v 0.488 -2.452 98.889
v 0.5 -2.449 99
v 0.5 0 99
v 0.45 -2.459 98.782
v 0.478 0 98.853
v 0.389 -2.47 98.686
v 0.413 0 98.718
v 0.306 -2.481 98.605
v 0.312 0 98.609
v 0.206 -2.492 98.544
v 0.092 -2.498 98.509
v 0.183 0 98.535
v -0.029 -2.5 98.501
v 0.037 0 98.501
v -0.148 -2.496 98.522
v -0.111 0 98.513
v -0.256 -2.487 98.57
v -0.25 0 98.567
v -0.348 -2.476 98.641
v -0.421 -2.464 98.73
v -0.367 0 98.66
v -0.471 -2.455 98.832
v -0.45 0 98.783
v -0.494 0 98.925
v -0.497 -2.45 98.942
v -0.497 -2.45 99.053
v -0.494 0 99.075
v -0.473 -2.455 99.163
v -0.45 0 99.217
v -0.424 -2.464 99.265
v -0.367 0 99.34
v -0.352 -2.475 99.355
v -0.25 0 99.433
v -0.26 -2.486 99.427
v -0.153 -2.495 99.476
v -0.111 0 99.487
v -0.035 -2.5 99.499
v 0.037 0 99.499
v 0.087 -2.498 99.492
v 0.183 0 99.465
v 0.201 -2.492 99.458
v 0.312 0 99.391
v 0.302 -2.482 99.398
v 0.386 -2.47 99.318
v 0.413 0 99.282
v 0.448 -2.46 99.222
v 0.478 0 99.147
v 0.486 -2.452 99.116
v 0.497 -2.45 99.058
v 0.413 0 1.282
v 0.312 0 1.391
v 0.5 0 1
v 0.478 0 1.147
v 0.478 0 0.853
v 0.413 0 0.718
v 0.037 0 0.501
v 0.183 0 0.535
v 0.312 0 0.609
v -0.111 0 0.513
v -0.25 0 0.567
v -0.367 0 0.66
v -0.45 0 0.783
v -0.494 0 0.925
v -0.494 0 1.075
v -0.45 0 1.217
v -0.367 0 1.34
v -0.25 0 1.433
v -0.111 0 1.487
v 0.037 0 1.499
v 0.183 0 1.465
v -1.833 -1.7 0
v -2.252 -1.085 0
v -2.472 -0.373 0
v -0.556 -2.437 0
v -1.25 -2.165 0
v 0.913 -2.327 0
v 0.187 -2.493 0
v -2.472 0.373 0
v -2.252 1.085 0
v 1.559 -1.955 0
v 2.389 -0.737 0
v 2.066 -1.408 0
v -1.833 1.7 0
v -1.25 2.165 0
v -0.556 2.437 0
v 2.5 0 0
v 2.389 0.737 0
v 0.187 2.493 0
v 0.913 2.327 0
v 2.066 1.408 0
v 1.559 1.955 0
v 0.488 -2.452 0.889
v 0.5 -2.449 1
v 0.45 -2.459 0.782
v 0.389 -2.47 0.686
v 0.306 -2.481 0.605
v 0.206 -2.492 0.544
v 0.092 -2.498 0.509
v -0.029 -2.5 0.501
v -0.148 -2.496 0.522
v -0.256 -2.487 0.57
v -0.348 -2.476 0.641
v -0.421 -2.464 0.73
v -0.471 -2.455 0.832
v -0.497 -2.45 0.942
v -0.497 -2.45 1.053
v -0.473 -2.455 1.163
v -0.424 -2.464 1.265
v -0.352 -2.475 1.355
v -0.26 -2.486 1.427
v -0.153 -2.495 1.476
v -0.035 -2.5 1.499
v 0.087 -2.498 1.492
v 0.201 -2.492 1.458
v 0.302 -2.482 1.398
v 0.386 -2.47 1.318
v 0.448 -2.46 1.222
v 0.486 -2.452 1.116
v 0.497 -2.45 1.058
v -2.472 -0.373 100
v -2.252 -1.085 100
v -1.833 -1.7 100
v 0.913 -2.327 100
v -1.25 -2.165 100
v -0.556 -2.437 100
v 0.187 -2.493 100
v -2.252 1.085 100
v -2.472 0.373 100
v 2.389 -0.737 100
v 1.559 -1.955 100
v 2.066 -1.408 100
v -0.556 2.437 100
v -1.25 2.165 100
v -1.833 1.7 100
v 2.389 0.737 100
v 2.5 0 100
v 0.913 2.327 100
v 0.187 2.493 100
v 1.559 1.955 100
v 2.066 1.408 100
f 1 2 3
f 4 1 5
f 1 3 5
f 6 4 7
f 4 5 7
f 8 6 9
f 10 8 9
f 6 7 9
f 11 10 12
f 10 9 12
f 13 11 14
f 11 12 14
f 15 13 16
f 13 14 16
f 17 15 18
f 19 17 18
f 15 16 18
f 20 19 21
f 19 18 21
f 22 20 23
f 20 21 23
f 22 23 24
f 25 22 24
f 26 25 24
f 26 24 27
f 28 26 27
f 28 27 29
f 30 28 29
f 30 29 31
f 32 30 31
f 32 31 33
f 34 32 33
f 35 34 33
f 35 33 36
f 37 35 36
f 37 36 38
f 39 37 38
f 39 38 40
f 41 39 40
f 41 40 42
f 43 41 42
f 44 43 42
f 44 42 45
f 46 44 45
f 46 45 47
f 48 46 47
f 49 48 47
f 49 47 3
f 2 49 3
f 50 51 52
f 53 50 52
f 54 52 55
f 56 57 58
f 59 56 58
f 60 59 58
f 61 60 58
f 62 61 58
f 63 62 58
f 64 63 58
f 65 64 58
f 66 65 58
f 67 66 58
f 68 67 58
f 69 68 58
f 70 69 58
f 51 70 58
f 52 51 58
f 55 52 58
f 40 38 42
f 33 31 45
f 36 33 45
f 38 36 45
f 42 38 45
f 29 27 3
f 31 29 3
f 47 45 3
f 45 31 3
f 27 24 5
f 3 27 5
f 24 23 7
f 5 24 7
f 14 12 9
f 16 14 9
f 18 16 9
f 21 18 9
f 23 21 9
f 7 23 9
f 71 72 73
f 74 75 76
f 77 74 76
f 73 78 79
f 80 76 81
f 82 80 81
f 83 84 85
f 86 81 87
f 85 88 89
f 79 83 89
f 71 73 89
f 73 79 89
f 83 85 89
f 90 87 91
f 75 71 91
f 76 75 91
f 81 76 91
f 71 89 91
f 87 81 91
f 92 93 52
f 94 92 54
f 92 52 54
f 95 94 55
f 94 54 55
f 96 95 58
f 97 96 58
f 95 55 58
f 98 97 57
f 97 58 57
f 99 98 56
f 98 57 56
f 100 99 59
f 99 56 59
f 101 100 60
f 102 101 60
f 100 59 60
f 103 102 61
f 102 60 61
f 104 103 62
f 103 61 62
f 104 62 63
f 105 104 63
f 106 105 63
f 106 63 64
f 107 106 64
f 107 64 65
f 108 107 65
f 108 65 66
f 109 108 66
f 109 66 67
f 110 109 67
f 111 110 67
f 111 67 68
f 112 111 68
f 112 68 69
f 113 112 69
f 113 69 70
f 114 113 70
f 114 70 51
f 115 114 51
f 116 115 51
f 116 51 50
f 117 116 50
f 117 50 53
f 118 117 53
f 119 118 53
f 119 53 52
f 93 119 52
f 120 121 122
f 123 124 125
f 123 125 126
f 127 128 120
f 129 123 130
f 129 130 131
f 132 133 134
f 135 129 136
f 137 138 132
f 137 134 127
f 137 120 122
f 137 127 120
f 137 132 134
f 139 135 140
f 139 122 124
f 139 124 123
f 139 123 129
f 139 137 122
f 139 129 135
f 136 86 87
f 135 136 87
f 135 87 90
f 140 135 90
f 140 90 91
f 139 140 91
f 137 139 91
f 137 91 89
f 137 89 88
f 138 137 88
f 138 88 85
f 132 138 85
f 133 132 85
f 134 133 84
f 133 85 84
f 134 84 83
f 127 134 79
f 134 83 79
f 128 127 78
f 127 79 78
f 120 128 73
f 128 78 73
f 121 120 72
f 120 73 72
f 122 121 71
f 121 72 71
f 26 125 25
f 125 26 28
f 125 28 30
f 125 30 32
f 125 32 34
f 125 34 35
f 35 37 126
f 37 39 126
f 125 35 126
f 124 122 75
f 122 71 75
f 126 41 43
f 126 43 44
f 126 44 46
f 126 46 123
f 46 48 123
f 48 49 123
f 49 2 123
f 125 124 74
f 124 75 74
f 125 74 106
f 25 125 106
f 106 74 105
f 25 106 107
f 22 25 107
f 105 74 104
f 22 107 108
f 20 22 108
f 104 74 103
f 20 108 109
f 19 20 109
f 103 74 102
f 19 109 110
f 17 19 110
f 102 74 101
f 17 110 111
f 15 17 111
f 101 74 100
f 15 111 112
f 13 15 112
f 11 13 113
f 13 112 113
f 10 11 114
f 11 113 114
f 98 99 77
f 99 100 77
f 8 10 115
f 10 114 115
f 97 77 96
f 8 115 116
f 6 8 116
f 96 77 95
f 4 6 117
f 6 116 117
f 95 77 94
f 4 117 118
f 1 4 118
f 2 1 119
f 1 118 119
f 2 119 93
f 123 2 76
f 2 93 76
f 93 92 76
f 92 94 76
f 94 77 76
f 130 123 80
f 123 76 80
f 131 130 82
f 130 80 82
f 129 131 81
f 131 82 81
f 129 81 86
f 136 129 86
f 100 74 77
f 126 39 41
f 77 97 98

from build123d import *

# Parameters (mm, degrees)
SCHIZZO1_R                   = 2.5
ESTRUSIONE_ESTRUSIONE1_DEPTH = 100
SCHIZZO2_R                   = 0.5
TAGLIO_ESTRUSIONE1_DEPTH     = 3.5
SCHIZZO3_R                   = 0.5
TAGLIO_ESTRUSIONE2_DEPTH     = 3.5000001


with BuildPart() as part:
    # Schizzo1 → Estrusione-Estrusione1 (new body)
    with BuildSketch(Plane.XY):
        Circle(SCHIZZO1_R)
    extrude(amount=ESTRUSIONE_ESTRUSIONE1_DEPTH)

    # Schizzo2 → Taglio-Estrusione1 (cut, through all)
    with BuildSketch(Plane(origin=(0, 0, 0), x_dir=(1, 0, 0), z_dir=(0, 1, 0))):
        with Locations((0, -1)):
            Circle(SCHIZZO2_R)
    extrude(amount=-TAGLIO_ESTRUSIONE1_DEPTH, mode=Mode.SUBTRACT)

    # Schizzo3 → Taglio-Estrusione2 (cut, through all)
    with BuildSketch(Plane(origin=(0, 0, 0), x_dir=(1, 0, 0), z_dir=(0, 1, 0))):
        with Locations((0, -99)):
            Circle(SCHIZZO3_R)
    extrude(amount=-TAGLIO_ESTRUSIONE2_DEPTH, mode=Mode.SUBTRACT)


solid = part.part
